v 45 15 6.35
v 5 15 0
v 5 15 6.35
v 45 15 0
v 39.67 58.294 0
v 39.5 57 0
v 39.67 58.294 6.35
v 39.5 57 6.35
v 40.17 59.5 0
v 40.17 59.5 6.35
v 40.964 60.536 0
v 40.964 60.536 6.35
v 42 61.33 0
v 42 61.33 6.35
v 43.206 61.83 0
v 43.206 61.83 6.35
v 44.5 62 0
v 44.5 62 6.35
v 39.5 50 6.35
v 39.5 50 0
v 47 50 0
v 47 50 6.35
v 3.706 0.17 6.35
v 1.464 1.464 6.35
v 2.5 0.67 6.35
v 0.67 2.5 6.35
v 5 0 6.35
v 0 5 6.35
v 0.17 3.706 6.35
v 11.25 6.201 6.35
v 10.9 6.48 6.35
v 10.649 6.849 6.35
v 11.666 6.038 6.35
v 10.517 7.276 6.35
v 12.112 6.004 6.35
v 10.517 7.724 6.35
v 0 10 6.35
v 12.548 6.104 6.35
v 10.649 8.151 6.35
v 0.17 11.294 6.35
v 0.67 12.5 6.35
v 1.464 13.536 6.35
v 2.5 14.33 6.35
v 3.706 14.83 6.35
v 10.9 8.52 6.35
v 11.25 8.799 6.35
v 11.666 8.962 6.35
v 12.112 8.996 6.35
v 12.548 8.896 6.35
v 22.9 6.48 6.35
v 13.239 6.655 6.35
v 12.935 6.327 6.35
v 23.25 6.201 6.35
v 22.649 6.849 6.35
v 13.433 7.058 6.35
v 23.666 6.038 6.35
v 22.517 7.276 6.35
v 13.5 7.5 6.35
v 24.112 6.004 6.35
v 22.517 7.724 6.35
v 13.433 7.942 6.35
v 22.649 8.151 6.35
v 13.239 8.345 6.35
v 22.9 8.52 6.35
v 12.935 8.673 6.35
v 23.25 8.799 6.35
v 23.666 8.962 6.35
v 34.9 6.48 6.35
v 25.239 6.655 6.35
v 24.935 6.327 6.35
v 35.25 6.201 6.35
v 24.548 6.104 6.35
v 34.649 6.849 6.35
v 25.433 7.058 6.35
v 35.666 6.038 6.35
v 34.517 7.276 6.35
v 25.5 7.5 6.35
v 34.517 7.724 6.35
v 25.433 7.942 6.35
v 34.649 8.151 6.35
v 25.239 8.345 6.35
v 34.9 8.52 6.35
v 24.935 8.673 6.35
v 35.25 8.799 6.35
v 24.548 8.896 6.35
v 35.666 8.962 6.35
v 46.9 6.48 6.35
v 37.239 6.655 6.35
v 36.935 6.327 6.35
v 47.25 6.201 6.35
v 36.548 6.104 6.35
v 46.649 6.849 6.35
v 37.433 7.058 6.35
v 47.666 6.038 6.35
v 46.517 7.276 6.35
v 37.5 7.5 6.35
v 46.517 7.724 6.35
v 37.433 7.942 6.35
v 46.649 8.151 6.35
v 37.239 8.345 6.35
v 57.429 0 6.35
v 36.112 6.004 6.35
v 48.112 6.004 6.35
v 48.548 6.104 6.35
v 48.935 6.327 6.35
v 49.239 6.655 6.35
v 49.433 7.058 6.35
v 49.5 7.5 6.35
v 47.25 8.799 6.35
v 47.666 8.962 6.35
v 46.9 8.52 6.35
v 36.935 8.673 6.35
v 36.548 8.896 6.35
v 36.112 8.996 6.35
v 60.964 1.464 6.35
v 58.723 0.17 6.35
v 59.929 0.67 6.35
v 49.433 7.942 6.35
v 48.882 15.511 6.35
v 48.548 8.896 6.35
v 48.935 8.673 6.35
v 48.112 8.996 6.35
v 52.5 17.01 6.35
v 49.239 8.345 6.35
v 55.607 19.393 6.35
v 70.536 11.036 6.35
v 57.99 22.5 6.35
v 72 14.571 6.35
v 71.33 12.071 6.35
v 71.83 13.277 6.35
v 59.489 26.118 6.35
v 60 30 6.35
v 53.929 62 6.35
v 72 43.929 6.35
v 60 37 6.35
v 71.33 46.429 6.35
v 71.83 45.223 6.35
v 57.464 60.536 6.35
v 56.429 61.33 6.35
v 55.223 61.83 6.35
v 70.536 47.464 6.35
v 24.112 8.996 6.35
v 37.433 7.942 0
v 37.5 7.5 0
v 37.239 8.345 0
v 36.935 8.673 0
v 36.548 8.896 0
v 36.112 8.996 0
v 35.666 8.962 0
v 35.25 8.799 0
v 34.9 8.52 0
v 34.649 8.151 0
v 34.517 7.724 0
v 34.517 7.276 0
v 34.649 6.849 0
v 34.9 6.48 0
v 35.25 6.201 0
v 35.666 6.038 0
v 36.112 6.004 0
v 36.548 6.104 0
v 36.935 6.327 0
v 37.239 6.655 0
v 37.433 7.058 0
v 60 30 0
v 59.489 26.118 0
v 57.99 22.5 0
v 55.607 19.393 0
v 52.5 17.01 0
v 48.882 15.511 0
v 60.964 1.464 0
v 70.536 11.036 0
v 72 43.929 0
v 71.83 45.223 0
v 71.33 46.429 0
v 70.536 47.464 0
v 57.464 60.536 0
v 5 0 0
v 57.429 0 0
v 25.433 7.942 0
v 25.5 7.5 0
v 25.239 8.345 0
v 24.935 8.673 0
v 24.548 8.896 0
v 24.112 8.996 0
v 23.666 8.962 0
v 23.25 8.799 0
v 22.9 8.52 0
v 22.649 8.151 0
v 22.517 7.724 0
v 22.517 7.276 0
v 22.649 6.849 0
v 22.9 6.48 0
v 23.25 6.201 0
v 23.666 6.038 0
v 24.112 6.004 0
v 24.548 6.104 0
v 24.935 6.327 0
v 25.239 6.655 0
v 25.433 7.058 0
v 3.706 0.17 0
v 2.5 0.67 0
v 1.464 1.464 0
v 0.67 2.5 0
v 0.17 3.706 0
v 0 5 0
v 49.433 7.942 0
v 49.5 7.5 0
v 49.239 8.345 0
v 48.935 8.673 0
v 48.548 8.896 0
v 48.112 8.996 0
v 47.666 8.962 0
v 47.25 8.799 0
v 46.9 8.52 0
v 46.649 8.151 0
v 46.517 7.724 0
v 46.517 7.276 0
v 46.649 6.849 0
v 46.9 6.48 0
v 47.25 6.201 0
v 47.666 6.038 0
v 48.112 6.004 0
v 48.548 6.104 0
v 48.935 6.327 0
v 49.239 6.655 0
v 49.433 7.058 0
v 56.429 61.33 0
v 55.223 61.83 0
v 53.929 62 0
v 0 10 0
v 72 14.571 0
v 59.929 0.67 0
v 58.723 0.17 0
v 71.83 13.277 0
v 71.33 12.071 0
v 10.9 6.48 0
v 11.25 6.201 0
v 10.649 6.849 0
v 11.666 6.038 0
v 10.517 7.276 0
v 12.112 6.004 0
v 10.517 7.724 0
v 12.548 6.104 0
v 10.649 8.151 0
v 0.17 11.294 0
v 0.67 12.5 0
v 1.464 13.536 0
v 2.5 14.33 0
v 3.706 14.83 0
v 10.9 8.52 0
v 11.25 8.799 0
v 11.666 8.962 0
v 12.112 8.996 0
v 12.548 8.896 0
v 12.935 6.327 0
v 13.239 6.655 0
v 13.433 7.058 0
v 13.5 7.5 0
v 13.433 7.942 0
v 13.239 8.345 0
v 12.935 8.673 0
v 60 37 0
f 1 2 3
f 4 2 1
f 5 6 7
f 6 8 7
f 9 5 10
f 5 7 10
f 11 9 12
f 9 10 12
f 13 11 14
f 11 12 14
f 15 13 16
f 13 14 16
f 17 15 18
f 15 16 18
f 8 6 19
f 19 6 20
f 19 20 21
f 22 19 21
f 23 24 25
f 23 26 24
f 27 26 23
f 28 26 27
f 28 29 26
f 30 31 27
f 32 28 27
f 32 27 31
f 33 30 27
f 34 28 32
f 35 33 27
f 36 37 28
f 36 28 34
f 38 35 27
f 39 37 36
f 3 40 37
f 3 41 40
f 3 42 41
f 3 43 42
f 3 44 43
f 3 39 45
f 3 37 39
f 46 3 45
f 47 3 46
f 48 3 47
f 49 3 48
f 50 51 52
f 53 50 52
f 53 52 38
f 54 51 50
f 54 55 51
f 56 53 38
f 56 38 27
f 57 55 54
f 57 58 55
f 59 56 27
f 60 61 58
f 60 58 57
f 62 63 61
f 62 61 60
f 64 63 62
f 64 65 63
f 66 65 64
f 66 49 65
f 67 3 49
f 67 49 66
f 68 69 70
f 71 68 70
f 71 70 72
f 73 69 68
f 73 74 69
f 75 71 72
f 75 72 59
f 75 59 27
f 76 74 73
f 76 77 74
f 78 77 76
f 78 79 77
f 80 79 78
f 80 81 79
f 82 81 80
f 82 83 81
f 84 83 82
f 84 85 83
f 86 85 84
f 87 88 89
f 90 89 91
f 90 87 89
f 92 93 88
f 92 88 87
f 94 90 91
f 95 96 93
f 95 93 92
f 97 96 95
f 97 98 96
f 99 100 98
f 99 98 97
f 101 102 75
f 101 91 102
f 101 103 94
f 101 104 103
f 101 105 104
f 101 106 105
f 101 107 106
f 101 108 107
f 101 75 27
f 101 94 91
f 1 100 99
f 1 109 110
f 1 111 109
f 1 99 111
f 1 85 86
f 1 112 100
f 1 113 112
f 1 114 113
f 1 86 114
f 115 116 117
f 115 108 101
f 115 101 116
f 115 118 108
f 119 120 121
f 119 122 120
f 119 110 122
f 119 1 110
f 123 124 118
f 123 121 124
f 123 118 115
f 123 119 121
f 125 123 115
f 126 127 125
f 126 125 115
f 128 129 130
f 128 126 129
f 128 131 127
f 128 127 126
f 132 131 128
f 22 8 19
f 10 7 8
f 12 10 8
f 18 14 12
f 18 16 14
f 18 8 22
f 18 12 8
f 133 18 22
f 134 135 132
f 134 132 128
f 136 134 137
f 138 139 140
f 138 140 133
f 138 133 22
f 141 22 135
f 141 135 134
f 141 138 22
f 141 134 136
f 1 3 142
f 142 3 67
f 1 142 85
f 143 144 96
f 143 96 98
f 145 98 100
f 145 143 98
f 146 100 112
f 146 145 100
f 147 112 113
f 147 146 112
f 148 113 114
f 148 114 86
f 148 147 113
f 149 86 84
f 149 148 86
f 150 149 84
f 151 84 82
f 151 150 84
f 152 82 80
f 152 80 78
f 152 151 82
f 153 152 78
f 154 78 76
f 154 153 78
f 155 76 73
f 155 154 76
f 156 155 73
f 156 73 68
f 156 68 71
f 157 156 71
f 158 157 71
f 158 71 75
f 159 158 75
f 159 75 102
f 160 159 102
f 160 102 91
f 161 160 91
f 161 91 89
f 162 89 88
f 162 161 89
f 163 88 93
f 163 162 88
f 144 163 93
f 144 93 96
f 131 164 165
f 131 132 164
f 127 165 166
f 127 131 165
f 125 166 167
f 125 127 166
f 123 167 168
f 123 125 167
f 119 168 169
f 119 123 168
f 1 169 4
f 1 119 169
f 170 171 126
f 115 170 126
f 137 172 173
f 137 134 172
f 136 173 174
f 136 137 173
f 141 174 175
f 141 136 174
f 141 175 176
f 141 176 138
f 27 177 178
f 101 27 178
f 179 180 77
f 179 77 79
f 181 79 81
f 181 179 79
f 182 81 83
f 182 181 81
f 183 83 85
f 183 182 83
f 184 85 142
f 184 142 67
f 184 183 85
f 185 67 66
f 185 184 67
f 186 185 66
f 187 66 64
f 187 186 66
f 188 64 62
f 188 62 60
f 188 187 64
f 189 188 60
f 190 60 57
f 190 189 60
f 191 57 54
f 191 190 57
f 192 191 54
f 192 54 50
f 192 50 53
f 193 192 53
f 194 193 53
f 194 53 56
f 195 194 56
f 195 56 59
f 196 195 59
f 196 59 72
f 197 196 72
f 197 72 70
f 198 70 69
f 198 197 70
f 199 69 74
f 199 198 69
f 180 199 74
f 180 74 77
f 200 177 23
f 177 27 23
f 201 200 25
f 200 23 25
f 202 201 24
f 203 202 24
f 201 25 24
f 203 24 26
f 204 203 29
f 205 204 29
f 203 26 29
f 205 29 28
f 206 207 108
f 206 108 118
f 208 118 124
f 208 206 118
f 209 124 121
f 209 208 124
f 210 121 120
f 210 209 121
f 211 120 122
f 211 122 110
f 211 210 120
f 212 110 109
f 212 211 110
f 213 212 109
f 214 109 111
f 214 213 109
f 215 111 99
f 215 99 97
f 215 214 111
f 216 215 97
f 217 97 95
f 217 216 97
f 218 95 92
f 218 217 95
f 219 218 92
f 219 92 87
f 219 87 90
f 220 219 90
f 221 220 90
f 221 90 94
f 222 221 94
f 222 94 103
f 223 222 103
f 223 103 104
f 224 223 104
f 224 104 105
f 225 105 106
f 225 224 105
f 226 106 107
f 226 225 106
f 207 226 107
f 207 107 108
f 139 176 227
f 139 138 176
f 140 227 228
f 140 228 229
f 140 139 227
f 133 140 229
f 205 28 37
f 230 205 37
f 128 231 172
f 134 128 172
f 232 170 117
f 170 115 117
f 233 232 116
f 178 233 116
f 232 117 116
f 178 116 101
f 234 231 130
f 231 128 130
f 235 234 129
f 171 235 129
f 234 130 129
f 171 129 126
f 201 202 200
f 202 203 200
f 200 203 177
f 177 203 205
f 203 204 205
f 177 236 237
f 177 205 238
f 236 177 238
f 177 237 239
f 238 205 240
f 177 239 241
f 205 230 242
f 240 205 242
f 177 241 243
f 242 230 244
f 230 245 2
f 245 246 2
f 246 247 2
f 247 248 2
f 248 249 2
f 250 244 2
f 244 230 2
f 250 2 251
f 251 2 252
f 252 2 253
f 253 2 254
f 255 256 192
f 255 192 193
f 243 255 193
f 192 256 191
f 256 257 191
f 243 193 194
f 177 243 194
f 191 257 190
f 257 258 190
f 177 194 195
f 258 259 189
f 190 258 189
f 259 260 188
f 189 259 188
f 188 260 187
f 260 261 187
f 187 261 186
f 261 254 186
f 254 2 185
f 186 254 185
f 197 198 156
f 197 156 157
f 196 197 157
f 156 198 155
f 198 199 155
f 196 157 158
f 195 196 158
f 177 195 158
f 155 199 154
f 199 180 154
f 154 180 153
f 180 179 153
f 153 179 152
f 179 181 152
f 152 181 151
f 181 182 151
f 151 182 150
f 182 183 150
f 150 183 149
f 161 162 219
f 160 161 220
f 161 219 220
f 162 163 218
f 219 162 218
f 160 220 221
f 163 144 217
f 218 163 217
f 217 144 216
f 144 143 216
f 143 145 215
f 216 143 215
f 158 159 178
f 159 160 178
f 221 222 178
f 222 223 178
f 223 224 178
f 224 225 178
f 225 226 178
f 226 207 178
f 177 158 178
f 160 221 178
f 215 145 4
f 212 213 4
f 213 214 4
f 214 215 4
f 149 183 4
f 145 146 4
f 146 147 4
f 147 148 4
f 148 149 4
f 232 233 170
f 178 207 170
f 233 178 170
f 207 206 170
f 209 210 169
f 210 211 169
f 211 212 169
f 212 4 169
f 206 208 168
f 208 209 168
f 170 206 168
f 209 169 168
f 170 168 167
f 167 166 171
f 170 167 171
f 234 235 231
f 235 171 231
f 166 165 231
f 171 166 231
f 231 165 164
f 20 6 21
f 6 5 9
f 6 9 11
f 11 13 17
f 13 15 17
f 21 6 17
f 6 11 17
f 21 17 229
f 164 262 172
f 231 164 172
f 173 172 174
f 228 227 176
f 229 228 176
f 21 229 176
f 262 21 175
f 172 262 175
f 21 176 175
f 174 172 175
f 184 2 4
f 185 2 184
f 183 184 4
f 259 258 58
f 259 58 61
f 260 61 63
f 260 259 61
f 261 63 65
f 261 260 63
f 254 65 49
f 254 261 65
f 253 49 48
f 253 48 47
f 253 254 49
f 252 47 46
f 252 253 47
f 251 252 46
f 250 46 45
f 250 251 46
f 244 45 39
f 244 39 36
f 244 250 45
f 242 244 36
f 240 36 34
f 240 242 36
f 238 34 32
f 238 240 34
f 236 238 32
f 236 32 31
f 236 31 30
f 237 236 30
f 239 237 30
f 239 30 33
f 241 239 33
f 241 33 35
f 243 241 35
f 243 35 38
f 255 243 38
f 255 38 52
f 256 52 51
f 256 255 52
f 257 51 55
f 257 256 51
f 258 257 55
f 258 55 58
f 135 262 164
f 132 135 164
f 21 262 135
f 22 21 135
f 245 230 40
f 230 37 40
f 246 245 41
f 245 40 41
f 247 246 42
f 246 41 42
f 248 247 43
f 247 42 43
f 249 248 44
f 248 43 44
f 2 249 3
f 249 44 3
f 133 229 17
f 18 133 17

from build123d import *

# Parameters (mm, degrees)
SKETCH1_W           = 60
SKETCH1_H           = 15
SKETCH1_R           = 1.5
BOSS_EXTRUDE1_DEPTH = 6.35
FILLET1_R           = 15
CHAMFER1_SIZE       = 13
FILLET3_R           = 5
CHAMFER2_SIZE       = 12.5
CHAMFER3_SIZE       = 16
FILLET4_R           = 5
FILLET5_R           = 5


with BuildPart() as part:
    # Sketch1 → Boss-Extrude1 (new body)
    with BuildSketch(Plane.XY):
        with Locations((30, 7.5)):
            Rectangle(SKETCH1_W, SKETCH1_H)
        with Locations((12, 7.5)):
            Circle(SKETCH1_R, mode=Mode.SUBTRACT)
        with Locations((24, 7.5)):
            Circle(SKETCH1_R, mode=Mode.SUBTRACT)
        with Locations((36, 7.5)):
            Circle(SKETCH1_R, mode=Mode.SUBTRACT)
        with Locations((48, 7.5)):
            Circle(SKETCH1_R, mode=Mode.SUBTRACT)
        Polygon((60, 15), (60, 0), (72, 0), (72, 50), (60, 50), align=None)
        Polygon((39.5, 50), (60, 50), (72, 50), (72, 62), (39.5, 62), align=None)
    extrude(amount=BOSS_EXTRUDE1_DEPTH)

    # Fillet1
    fillet1_edges = [part.edges().sort_by_distance(p)[0] for p in [
        (60, 15, 3.175),
    ]]
    fillet(fillet1_edges, radius=FILLET1_R)

    # Chamfer1
    chamfer1_edges = [part.edges().sort_by_distance(p)[0] for p in [
        (60, 50, 3.175),
    ]]
    chamfer(chamfer1_edges, length=CHAMFER1_SIZE)

    # Fillet3
    fillet3_edges = [part.edges().sort_by_distance(p)[0] for p in [
        (39.5, 62, 3.175),
    ]]
    fillet(fillet3_edges, radius=FILLET3_R)

    # Chamfer2
    chamfer2_edges = [part.edges().sort_by_distance(p)[0] for p in [
        (72, 0, 3.175),
    ]]
    chamfer(chamfer2_edges, length=CHAMFER2_SIZE)

    # Chamfer3
    chamfer3_edges = [part.edges().sort_by_distance(p)[0] for p in [
        (72, 62, 3.175),
    ]]
    chamfer(chamfer3_edges, length=CHAMFER3_SIZE)

    # Fillet4
    fillet4_edges = [part.edges().sort_by_distance(p)[0] for p in [
        (72, 12.5, 3.175),
        (59.5, 0, 3.175),
        (56, 62, 3.175),
        (72, 46, 3.175),
    ]]
    fillet(fillet4_edges, radius=FILLET4_R)

    # Fillet5
    fillet5_edges = [part.edges().sort_by_distance(p)[0] for p in [
        (0, 0, 3.175),
        (0, 15, 3.175),
    ]]
    fillet(fillet5_edges, radius=FILLET5_R)


solid = part.part
